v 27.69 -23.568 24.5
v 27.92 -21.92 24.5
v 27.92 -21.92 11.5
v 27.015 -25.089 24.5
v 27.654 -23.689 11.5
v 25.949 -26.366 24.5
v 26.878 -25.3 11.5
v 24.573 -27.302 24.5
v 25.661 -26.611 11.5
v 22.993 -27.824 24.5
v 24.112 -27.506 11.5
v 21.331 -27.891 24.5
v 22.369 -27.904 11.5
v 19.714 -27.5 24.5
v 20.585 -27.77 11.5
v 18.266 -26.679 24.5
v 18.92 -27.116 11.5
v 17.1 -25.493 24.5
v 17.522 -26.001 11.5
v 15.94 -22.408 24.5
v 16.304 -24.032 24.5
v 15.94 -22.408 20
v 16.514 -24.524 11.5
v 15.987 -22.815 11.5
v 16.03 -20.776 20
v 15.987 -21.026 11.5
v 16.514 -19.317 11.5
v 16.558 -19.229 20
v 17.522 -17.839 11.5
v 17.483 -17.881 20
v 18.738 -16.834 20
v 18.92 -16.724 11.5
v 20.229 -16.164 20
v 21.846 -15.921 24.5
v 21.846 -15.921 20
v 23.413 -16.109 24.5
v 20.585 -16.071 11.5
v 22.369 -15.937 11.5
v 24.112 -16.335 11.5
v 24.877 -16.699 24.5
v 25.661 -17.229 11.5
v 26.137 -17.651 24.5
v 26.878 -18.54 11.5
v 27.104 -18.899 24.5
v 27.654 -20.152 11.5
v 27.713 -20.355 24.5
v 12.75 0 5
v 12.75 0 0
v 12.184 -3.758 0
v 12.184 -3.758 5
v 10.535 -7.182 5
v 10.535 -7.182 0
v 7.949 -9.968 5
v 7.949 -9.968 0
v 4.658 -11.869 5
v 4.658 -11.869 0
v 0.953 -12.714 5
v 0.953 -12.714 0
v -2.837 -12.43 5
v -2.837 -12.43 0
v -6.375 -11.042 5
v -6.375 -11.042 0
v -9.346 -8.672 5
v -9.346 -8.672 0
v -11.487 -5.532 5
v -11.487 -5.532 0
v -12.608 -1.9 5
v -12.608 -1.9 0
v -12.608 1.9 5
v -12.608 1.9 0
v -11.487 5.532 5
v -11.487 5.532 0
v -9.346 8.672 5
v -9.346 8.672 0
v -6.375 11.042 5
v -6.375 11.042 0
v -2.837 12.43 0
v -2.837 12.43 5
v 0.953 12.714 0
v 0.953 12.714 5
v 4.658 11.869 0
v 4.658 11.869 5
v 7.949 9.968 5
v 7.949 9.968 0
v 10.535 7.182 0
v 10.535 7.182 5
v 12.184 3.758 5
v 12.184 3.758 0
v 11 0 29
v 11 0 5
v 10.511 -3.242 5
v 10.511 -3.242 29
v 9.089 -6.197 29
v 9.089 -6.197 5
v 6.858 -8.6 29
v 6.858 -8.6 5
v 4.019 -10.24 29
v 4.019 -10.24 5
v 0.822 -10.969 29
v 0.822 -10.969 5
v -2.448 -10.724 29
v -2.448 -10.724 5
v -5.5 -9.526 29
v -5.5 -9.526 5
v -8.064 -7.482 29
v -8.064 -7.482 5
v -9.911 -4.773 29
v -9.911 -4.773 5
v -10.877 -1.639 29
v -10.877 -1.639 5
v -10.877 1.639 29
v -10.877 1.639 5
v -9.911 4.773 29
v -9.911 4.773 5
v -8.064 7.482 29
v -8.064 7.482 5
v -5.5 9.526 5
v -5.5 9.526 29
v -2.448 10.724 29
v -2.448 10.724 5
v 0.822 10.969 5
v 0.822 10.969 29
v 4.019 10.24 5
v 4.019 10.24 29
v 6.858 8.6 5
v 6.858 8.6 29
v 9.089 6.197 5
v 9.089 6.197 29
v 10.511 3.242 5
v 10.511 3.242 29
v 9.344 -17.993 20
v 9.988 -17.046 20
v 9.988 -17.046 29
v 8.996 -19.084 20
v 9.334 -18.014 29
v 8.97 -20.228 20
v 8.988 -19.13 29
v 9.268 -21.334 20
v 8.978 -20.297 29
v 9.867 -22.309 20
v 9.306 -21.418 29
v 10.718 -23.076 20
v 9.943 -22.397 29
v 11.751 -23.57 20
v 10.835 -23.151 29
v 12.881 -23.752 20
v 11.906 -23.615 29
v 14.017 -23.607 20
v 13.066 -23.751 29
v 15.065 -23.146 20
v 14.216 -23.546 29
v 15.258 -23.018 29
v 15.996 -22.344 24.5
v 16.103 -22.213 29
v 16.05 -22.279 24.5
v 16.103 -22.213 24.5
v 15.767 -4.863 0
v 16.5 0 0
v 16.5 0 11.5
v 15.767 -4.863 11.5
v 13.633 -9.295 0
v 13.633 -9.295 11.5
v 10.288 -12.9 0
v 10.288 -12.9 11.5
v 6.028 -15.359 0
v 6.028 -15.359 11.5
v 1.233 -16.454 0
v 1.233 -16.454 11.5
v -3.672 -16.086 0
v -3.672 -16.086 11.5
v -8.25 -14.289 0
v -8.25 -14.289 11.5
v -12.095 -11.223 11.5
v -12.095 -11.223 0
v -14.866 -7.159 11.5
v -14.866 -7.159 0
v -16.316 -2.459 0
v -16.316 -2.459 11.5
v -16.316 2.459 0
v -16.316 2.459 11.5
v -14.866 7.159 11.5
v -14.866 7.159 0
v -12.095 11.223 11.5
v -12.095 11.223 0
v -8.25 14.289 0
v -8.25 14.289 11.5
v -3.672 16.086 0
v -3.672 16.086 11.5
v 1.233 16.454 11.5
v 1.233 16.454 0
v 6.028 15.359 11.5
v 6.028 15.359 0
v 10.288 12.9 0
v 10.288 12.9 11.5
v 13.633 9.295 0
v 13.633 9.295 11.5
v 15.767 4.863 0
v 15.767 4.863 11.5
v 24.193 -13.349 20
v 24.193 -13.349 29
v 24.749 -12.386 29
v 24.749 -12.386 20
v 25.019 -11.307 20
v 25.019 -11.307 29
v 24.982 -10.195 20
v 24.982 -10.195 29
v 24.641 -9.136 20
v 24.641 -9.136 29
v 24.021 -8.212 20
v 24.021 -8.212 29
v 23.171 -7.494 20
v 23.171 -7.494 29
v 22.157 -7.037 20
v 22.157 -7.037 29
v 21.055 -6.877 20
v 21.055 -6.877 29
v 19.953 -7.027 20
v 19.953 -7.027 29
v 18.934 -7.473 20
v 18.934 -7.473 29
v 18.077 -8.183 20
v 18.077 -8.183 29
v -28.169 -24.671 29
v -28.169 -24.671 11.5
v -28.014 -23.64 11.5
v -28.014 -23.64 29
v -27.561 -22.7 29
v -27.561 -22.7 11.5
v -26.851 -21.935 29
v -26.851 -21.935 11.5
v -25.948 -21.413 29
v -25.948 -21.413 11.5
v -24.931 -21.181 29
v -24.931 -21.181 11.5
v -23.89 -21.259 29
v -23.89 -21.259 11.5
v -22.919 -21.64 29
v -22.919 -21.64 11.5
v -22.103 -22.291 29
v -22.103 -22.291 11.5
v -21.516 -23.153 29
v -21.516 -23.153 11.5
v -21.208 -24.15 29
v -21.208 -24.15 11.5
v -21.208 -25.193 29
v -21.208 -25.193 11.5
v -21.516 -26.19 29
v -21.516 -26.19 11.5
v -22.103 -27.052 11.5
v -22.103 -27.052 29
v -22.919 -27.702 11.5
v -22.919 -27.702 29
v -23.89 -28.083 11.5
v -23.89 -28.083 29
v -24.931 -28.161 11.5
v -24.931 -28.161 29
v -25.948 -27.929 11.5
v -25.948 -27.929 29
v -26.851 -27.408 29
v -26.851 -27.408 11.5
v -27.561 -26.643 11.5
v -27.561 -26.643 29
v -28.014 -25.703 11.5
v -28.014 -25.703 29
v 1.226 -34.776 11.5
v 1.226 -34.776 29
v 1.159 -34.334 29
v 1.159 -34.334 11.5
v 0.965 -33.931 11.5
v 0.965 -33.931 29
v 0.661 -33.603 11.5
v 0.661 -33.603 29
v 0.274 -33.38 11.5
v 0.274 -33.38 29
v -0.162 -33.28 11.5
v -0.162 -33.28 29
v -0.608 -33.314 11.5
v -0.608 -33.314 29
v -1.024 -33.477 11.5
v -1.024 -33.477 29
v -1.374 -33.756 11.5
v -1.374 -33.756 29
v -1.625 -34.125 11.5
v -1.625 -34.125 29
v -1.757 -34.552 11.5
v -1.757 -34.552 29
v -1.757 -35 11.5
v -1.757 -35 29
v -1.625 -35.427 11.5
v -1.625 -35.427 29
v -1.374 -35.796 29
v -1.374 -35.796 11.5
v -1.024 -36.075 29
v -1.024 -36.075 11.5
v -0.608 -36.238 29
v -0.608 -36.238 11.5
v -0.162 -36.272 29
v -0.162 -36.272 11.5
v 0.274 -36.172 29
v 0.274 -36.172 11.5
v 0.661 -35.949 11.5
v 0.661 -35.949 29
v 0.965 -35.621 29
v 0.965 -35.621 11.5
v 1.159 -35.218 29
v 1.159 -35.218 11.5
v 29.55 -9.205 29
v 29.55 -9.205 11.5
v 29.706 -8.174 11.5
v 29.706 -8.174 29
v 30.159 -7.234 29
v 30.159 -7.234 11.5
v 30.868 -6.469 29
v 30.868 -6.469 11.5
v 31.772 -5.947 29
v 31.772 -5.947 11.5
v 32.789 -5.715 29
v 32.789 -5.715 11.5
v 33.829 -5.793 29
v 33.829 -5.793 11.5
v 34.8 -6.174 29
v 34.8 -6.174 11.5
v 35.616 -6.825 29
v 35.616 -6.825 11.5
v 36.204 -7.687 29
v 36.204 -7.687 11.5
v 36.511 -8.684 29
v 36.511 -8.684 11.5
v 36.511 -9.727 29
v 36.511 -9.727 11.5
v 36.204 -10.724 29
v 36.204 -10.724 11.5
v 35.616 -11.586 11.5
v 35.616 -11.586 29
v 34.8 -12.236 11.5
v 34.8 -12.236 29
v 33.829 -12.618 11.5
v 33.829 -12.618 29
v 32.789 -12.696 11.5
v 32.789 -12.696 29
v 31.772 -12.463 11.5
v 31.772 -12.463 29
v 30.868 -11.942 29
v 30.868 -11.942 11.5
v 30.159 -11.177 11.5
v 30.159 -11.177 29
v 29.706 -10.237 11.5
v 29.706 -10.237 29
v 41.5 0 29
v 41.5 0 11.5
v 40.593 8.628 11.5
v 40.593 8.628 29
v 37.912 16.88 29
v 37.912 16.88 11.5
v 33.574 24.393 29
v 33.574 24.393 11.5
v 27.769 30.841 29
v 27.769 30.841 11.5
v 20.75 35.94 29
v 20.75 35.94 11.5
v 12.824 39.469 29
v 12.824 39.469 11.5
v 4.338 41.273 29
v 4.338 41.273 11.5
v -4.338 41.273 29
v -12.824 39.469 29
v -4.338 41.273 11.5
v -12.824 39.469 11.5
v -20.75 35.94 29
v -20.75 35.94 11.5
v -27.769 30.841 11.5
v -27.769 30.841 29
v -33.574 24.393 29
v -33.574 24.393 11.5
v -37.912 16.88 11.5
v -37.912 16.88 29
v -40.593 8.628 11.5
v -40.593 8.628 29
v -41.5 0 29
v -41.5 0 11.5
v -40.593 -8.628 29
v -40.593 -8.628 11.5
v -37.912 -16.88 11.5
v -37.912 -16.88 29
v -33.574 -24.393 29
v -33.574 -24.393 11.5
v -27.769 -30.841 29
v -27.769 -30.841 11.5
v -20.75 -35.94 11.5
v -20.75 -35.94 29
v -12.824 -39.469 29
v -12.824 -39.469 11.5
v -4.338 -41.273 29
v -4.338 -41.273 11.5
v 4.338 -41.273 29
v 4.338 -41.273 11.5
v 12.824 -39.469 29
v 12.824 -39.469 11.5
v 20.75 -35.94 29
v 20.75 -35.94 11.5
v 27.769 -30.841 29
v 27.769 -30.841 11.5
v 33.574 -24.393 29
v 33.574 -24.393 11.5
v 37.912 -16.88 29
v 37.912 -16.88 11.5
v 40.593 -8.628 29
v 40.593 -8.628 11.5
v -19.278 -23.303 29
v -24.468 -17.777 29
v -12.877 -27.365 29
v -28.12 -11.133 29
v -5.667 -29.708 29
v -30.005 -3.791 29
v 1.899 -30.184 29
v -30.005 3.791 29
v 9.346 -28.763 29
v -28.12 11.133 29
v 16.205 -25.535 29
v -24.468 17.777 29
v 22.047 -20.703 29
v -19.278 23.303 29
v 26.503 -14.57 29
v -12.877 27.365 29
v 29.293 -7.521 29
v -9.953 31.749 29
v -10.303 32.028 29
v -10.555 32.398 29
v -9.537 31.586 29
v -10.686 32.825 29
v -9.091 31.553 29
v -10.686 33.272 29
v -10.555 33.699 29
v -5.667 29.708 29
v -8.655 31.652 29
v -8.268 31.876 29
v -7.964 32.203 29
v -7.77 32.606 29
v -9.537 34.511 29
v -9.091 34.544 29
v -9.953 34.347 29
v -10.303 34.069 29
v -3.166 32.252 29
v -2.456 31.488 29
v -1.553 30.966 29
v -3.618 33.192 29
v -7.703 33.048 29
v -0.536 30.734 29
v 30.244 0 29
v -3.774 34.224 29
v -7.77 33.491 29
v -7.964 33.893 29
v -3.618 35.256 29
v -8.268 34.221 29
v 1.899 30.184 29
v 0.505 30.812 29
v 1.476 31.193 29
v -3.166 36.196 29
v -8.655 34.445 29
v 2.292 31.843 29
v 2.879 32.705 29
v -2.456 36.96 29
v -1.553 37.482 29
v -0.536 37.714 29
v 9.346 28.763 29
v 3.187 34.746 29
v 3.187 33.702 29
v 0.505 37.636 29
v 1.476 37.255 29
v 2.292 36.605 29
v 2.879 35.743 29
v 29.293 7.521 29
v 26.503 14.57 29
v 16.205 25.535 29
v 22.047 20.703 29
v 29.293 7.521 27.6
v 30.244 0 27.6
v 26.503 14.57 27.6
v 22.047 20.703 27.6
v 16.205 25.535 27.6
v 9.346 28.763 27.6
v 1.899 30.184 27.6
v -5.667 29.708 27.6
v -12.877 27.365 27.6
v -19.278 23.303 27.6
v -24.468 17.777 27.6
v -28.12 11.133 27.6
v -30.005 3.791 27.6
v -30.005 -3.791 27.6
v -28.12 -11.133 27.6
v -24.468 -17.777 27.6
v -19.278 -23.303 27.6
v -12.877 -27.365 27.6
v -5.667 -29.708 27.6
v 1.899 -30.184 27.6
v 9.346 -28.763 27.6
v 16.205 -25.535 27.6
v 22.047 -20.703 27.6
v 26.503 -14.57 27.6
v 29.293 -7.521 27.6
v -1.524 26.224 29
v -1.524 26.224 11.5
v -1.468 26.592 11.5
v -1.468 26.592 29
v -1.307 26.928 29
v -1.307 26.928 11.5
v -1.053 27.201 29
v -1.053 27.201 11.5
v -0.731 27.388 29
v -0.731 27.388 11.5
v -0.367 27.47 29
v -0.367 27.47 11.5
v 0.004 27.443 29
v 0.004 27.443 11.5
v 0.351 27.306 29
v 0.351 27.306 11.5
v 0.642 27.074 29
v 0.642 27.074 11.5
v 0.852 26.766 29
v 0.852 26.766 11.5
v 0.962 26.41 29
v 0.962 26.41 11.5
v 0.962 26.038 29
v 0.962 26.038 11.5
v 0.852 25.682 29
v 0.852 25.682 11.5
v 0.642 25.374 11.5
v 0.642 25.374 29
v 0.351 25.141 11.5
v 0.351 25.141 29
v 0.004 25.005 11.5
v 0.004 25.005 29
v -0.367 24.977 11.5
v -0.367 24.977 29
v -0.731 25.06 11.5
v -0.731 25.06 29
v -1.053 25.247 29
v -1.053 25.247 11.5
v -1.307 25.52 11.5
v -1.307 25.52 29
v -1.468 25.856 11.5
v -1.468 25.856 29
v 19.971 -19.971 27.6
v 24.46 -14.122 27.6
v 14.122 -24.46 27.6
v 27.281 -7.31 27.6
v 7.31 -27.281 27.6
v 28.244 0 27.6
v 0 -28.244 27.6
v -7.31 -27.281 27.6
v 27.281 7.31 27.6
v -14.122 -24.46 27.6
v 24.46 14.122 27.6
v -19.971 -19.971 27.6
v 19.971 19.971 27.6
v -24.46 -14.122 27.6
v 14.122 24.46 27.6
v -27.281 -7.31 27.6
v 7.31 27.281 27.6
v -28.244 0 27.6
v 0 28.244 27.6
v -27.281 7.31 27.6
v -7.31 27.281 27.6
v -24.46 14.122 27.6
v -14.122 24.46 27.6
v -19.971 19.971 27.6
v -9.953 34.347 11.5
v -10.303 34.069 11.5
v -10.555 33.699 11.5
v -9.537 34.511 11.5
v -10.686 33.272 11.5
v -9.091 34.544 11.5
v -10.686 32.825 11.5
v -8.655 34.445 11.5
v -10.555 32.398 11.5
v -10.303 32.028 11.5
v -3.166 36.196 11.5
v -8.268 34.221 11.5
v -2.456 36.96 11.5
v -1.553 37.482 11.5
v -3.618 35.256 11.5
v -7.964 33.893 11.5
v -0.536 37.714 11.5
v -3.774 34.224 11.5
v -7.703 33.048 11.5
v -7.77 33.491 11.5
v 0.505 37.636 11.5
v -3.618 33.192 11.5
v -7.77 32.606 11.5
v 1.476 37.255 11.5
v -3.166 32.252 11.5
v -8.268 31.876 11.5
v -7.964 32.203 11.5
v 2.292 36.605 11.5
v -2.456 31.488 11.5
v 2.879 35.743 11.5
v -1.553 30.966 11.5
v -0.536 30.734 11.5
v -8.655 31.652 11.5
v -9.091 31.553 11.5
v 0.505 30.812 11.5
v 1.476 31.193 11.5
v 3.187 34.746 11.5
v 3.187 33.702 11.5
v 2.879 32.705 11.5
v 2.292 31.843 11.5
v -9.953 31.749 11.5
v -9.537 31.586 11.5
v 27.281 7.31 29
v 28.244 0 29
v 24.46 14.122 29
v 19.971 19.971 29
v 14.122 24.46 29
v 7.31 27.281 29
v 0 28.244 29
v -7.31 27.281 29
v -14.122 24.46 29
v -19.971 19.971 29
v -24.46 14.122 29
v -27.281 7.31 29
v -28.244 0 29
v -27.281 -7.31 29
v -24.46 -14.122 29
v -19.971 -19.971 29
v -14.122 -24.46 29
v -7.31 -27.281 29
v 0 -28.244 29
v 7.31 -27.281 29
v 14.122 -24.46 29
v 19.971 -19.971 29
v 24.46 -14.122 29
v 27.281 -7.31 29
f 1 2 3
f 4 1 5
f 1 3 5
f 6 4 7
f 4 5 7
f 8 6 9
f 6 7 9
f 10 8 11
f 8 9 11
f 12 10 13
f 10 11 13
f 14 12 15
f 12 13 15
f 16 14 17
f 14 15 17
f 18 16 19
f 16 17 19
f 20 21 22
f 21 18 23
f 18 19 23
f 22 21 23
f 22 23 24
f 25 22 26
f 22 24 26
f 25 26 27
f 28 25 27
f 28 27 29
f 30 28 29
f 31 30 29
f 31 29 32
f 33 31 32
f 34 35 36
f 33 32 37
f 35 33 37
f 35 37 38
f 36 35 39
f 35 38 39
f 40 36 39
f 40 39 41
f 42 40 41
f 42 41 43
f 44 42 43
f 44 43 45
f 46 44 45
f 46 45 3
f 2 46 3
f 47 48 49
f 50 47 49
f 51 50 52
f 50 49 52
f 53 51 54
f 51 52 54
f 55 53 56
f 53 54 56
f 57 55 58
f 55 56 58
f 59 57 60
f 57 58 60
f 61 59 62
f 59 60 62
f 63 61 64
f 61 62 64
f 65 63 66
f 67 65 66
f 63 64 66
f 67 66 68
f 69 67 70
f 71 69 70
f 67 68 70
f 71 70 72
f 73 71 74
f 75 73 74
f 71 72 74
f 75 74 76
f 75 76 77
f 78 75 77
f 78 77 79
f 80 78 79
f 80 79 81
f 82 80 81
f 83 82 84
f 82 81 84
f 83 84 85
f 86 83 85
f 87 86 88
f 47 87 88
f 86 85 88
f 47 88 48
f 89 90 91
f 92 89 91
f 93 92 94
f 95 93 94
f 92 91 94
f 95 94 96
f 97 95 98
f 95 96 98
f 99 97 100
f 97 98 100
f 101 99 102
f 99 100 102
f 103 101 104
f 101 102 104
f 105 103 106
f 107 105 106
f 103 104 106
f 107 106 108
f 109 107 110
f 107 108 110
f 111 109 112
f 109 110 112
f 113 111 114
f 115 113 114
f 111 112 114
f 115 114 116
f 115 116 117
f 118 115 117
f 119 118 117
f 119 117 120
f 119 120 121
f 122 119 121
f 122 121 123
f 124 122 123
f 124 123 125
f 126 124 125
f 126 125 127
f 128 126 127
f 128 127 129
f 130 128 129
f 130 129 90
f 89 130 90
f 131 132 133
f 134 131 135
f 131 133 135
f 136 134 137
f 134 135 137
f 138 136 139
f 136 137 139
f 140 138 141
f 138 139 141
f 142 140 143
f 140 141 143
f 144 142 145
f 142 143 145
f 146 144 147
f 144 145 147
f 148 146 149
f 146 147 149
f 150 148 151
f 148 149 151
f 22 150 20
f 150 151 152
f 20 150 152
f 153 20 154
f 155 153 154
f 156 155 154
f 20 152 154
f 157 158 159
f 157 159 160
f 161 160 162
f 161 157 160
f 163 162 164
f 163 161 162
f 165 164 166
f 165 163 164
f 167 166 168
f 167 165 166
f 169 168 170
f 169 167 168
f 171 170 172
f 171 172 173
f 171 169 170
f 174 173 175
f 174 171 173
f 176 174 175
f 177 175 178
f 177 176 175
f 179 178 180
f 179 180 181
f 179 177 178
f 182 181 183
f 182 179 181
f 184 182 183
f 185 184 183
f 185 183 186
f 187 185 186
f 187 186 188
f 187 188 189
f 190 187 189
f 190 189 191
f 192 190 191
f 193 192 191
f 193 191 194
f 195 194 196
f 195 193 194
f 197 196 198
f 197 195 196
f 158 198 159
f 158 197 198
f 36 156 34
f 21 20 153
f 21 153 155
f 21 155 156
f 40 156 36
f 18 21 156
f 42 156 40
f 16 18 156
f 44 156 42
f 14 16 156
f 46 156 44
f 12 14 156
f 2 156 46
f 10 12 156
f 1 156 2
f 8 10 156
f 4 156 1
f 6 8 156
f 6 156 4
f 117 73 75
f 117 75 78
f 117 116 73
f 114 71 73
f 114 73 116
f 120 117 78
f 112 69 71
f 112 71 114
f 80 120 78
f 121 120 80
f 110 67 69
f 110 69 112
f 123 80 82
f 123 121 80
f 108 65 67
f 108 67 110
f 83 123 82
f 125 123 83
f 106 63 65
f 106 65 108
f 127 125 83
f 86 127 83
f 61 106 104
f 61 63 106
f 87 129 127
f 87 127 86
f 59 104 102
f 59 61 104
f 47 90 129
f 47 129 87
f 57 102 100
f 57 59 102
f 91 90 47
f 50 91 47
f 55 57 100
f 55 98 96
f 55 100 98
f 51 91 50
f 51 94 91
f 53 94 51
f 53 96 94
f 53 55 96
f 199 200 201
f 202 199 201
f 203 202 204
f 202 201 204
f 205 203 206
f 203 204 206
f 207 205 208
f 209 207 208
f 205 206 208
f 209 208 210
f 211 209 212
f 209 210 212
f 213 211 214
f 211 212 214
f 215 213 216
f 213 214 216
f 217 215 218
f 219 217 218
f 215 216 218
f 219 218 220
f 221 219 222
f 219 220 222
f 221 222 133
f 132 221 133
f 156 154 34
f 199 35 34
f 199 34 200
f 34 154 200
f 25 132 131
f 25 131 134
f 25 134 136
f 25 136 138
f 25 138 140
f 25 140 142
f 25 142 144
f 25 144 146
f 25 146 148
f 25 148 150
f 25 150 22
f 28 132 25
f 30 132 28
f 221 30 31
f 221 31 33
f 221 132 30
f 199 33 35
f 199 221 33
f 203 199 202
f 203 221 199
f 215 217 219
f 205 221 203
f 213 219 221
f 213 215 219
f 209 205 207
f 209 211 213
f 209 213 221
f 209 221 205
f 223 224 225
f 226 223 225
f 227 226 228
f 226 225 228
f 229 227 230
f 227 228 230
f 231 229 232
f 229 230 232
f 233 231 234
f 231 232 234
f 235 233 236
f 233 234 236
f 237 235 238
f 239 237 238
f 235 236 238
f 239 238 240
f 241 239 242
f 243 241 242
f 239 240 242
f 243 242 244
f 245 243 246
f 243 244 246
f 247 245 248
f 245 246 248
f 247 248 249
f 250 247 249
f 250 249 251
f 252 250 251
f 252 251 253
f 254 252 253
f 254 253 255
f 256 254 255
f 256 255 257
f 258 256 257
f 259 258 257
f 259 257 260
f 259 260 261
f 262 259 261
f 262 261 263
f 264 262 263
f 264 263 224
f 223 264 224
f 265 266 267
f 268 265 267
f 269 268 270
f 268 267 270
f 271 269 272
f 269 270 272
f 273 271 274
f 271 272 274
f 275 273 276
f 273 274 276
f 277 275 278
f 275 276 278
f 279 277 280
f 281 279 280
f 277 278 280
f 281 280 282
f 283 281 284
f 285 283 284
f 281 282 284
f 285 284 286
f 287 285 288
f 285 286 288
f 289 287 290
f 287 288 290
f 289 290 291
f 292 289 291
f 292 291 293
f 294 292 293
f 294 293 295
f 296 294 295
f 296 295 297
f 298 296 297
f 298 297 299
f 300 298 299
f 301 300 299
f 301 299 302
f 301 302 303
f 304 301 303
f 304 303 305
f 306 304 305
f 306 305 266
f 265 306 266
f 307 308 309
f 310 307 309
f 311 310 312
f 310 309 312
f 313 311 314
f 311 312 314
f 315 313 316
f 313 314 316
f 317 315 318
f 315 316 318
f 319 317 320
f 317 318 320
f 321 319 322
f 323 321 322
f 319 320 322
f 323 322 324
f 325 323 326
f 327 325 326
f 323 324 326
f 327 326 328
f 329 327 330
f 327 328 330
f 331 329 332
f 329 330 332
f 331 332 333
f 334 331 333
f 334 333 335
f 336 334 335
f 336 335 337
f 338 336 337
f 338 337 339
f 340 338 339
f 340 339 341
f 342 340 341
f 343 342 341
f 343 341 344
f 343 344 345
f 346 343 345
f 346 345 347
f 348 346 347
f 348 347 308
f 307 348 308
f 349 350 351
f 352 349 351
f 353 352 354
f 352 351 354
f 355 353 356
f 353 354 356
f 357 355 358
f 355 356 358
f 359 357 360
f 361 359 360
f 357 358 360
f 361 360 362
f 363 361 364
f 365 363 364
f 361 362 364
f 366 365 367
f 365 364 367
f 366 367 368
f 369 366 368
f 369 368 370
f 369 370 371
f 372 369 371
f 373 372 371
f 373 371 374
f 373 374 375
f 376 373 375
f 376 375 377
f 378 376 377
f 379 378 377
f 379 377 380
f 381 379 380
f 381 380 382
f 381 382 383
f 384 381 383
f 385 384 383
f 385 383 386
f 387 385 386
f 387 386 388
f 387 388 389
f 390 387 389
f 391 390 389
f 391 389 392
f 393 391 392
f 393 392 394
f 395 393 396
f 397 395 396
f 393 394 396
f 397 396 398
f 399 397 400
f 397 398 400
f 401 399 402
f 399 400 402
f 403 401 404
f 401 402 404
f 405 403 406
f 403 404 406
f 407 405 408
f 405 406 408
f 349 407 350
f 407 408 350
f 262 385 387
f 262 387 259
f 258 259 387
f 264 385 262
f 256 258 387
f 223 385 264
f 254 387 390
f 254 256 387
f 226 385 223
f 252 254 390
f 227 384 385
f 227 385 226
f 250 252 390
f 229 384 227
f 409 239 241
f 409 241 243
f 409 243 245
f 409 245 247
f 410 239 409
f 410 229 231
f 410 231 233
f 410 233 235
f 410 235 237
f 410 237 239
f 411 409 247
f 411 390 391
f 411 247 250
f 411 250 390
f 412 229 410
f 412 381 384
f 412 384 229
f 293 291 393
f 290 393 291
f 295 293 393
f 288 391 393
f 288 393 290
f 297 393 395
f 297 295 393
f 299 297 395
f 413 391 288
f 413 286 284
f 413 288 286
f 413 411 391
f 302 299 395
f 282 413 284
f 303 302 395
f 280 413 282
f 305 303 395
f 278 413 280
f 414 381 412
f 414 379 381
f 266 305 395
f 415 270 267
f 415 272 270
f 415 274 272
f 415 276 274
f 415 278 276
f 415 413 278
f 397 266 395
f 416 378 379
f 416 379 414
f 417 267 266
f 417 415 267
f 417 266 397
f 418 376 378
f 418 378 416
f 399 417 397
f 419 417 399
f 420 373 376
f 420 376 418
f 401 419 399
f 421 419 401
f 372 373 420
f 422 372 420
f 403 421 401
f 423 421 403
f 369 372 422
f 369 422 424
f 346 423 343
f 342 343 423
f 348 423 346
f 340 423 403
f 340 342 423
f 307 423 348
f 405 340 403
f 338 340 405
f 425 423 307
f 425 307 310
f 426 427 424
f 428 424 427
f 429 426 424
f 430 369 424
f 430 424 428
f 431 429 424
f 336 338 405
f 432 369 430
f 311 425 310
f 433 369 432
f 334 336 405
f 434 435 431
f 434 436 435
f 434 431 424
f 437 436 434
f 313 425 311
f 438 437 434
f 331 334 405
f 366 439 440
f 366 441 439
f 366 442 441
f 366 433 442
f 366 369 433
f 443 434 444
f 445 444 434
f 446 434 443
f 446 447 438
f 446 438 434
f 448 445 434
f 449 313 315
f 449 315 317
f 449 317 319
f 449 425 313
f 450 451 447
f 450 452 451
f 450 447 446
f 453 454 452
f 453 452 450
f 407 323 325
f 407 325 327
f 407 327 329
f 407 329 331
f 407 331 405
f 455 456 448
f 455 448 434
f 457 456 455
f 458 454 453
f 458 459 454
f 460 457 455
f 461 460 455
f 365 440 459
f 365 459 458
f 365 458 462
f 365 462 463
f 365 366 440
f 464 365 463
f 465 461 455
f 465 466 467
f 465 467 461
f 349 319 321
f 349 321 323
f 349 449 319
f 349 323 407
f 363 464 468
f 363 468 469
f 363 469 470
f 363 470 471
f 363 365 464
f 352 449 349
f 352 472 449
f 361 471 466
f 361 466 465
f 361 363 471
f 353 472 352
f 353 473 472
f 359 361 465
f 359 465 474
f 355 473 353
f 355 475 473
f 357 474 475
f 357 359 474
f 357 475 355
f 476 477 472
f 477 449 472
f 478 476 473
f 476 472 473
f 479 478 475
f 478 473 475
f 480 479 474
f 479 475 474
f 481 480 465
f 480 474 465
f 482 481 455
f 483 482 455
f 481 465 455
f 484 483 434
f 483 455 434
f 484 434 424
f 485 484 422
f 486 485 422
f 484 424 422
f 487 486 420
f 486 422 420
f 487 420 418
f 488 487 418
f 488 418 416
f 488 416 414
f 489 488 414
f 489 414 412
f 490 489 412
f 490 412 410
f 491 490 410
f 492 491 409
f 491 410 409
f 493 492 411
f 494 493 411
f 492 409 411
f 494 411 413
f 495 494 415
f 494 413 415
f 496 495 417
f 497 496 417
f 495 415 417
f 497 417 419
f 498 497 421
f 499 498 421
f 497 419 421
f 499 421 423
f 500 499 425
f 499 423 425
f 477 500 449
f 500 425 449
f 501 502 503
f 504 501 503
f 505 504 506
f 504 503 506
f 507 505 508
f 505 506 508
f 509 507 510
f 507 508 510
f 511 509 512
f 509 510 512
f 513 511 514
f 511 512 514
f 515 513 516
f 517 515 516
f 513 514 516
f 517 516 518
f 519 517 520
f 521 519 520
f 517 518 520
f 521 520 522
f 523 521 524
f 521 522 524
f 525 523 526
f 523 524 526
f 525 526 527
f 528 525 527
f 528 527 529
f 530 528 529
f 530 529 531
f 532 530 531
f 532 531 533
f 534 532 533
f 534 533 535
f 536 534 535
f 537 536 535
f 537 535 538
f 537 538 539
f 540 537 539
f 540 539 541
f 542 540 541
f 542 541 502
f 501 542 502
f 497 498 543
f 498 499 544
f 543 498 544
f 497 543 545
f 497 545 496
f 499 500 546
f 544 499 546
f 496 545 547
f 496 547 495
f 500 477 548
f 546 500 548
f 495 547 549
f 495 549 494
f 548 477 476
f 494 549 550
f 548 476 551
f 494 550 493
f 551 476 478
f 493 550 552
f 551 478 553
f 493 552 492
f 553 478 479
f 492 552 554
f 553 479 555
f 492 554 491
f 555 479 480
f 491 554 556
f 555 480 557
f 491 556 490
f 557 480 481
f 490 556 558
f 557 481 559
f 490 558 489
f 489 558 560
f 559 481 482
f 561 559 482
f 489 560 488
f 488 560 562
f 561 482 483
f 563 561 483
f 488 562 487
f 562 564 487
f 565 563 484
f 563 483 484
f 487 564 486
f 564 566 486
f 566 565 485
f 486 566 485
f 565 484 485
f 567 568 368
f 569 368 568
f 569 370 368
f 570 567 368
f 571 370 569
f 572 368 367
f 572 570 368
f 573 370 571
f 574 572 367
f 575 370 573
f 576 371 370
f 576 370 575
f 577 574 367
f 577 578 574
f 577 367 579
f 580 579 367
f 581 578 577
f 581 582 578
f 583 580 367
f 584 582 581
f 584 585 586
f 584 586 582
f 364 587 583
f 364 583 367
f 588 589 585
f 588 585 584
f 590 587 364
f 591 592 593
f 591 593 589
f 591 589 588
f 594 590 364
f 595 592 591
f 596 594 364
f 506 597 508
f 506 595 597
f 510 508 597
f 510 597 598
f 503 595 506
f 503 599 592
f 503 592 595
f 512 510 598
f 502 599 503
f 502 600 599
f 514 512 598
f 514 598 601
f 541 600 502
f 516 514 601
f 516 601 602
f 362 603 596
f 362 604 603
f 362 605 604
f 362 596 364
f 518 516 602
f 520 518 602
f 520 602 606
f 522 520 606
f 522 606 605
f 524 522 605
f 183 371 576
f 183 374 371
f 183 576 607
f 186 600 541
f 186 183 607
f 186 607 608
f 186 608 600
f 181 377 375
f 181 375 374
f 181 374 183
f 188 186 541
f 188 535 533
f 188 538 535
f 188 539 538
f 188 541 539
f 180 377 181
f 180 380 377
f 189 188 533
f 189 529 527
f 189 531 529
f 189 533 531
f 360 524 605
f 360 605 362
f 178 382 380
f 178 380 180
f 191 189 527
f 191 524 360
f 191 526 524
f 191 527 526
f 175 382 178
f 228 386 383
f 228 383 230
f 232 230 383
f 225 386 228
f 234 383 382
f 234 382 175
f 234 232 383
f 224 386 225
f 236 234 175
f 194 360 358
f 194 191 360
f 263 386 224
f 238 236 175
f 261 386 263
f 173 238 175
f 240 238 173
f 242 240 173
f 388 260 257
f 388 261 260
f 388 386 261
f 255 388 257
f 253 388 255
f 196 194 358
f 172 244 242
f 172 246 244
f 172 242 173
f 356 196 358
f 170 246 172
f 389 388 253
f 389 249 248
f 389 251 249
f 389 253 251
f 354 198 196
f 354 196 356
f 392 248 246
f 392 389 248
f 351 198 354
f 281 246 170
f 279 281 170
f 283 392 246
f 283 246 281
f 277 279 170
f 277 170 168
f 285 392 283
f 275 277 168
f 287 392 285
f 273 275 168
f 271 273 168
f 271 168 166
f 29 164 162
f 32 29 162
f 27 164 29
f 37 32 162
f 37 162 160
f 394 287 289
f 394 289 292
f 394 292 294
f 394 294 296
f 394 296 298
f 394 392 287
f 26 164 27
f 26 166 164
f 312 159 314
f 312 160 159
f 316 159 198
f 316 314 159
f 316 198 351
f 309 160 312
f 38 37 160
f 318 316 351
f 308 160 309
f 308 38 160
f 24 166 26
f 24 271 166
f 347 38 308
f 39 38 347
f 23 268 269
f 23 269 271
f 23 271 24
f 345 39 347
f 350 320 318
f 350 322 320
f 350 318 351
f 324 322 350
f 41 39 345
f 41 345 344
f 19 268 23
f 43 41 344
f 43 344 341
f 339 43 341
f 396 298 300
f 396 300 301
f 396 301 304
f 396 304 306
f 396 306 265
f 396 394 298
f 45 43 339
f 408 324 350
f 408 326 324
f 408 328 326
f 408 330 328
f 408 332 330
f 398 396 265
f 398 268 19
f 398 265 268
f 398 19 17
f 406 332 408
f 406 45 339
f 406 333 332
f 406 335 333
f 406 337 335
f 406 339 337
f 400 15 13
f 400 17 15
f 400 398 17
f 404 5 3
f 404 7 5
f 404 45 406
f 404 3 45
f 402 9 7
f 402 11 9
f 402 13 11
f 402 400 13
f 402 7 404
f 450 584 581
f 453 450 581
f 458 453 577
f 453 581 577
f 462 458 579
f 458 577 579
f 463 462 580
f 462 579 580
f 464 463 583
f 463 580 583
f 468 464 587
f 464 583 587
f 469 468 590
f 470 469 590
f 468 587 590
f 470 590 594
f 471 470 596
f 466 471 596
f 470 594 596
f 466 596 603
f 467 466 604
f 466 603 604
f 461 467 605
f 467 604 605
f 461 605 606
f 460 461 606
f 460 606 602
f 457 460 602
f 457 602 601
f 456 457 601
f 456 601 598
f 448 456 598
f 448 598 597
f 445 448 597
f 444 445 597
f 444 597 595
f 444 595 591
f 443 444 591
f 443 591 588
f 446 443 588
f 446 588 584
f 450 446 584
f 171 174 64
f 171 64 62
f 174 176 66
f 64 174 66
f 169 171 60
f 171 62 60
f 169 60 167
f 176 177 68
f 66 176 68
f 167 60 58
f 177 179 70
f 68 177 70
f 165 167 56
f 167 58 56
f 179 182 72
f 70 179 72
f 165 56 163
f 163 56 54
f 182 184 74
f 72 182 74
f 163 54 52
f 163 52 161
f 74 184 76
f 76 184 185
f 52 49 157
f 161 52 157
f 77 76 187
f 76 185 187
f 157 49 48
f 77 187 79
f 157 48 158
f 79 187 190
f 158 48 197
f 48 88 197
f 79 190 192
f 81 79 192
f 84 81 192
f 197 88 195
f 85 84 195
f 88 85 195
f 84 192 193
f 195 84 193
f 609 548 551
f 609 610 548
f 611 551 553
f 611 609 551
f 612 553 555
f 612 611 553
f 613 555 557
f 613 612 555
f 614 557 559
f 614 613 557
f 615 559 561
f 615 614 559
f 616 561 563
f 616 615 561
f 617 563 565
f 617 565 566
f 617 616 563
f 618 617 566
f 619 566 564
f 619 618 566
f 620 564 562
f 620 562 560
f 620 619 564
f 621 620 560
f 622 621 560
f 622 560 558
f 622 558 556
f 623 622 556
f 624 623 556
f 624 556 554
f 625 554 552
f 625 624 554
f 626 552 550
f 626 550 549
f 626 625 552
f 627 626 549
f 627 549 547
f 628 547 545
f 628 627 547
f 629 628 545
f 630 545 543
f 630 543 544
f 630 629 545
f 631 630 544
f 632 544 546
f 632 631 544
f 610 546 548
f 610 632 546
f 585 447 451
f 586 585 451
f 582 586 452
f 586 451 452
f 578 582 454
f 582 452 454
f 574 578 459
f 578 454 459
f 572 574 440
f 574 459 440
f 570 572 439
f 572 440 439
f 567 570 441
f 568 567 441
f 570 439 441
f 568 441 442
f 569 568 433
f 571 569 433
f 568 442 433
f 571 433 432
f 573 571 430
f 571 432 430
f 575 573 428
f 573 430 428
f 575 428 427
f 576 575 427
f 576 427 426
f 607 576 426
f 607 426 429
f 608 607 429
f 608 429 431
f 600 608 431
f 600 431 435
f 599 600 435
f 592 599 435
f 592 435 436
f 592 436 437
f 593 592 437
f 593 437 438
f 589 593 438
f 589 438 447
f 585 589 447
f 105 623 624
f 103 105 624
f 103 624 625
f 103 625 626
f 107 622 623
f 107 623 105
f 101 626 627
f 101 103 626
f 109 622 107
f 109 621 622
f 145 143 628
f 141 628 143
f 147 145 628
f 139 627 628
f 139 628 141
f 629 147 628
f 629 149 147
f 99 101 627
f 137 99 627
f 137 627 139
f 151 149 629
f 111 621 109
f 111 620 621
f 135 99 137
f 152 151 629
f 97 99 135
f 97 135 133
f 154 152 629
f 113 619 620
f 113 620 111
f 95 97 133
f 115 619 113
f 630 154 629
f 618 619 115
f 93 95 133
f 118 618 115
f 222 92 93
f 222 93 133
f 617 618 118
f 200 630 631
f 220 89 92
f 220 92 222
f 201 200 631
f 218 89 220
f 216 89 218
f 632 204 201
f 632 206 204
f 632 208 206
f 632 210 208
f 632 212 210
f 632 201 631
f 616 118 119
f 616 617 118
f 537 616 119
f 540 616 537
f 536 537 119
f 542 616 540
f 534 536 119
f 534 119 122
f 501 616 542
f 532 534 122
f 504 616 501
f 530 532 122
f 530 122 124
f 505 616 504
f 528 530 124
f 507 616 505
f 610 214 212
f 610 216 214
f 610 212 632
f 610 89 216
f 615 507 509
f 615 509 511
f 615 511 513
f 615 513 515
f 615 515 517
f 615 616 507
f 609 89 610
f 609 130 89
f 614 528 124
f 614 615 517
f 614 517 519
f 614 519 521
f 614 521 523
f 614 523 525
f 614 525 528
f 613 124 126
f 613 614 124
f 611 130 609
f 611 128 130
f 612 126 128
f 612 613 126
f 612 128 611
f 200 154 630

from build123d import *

# Parameters (mm, degrees)
F0_R      = 41.5
F1_DEPTH  = 29
F2_R      = 41.5
F2_R_2    = 16.5
F3_DEPTH  = 11.5
F4_R      = 11
F5_DEPTH  = 29.001
F6_R      = 12.75
F7_DEPTH  = 5
F8_R      = 1.5
F9_DEPTH  = 29.001
F10_D     = 7
F11_W     = 2
F11_H     = 1.4
F13_D     = 2.5
F15_DEPTH = 9
F16_R     = 6
F17_DEPTH = 13


with BuildPart() as f1:
    # F0 (on Top) → F1 (new body)
    with BuildSketch(Plane.XY):
        Circle(F0_R)
    extrude(amount=F1_DEPTH)

    # F2 (on face) → F3 (cut)
    with BuildSketch(Plane(origin=(0, 0, 0), x_dir=(1, 0, 0), z_dir=(0, 0, -1))):
        Circle(F2_R)
        Circle(F2_R_2, mode=Mode.SUBTRACT)
    extrude(amount=-F3_DEPTH, mode=Mode.SUBTRACT)

    # F4 (on face) → F5 (cut, through all)
    with BuildSketch(Plane(origin=(0, 0, 0), x_dir=(1, 0, 0), z_dir=(0, 0, -1))):
        Circle(F4_R)
    extrude(amount=-F5_DEPTH, mode=Mode.SUBTRACT)

    # F6 (on face) → F7 (cut)
    with BuildSketch(Plane(origin=(0, 0, 0), x_dir=(1, 0, 0), z_dir=(0, 0, -1))):
        Circle(F6_R)
    extrude(amount=-F7_DEPTH, mode=Mode.SUBTRACT)

    # F8 (on face) → F9 (cut, through all)
    with BuildSketch(Plane.XY.offset(29)):
        with Locations((-9.203227, 33.048392)):
            Circle(F8_R)
        with Locations((-0.27397, -34.776049)):
            Circle(F8_R)
    extrude(amount=-F9_DEPTH, mode=Mode.SUBTRACT)

    # F10 (through all)
    with Locations(Plane.XY.offset(29)):
        with Locations((-0.27397, 34.223951), (33.050471, -9.205307), (-24.669154, -24.671233)):
            Hole(F10_D / 2)

    # F11 (on Front) → F12 (revolve, cut)
    with BuildSketch(Plane.XZ):
        with Locations((29.24357, 28.3)):
            Rectangle(F11_W, F11_H)
    revolve(axis=Axis((0, 0, 11.697991), (0, 0, 1)), mode=Mode.SUBTRACT)

    # F13 (through all)
    with Locations(Plane.XY.offset(29)):
        with Locations((-0.27397, 26.223951)):
            Hole(F13_D / 2)

    # F14 (on face) → F15 (cut)
    with BuildSketch(Plane.XY.offset(29)):
        with BuildLine():
            Line((16.103088, -22.212727), (24.192653, -13.349379))
            ThreePointArc((24.192653, -13.349379), (23.621079, -7.823223), (18.07709, -8.182768))
            Line((18.07709, -8.182768), (9.987525, -17.046116))
            ThreePointArc((9.987525, -17.046116), (10.361111, -22.806624), (16.103088, -22.212727))
        make_face()
    extrude(amount=-F15_DEPTH, mode=Mode.SUBTRACT)

    # F16 (on face) → F17 (cut)
    with BuildSketch(Plane(origin=(0, 0, 11.5), x_dir=(1, 0, 0), z_dir=(0, 0, -1))):
        with Locations((21.92031, 21.92031)):
            Circle(F16_R)
    extrude(amount=-F17_DEPTH, mode=Mode.SUBTRACT)


solid = f1.part
